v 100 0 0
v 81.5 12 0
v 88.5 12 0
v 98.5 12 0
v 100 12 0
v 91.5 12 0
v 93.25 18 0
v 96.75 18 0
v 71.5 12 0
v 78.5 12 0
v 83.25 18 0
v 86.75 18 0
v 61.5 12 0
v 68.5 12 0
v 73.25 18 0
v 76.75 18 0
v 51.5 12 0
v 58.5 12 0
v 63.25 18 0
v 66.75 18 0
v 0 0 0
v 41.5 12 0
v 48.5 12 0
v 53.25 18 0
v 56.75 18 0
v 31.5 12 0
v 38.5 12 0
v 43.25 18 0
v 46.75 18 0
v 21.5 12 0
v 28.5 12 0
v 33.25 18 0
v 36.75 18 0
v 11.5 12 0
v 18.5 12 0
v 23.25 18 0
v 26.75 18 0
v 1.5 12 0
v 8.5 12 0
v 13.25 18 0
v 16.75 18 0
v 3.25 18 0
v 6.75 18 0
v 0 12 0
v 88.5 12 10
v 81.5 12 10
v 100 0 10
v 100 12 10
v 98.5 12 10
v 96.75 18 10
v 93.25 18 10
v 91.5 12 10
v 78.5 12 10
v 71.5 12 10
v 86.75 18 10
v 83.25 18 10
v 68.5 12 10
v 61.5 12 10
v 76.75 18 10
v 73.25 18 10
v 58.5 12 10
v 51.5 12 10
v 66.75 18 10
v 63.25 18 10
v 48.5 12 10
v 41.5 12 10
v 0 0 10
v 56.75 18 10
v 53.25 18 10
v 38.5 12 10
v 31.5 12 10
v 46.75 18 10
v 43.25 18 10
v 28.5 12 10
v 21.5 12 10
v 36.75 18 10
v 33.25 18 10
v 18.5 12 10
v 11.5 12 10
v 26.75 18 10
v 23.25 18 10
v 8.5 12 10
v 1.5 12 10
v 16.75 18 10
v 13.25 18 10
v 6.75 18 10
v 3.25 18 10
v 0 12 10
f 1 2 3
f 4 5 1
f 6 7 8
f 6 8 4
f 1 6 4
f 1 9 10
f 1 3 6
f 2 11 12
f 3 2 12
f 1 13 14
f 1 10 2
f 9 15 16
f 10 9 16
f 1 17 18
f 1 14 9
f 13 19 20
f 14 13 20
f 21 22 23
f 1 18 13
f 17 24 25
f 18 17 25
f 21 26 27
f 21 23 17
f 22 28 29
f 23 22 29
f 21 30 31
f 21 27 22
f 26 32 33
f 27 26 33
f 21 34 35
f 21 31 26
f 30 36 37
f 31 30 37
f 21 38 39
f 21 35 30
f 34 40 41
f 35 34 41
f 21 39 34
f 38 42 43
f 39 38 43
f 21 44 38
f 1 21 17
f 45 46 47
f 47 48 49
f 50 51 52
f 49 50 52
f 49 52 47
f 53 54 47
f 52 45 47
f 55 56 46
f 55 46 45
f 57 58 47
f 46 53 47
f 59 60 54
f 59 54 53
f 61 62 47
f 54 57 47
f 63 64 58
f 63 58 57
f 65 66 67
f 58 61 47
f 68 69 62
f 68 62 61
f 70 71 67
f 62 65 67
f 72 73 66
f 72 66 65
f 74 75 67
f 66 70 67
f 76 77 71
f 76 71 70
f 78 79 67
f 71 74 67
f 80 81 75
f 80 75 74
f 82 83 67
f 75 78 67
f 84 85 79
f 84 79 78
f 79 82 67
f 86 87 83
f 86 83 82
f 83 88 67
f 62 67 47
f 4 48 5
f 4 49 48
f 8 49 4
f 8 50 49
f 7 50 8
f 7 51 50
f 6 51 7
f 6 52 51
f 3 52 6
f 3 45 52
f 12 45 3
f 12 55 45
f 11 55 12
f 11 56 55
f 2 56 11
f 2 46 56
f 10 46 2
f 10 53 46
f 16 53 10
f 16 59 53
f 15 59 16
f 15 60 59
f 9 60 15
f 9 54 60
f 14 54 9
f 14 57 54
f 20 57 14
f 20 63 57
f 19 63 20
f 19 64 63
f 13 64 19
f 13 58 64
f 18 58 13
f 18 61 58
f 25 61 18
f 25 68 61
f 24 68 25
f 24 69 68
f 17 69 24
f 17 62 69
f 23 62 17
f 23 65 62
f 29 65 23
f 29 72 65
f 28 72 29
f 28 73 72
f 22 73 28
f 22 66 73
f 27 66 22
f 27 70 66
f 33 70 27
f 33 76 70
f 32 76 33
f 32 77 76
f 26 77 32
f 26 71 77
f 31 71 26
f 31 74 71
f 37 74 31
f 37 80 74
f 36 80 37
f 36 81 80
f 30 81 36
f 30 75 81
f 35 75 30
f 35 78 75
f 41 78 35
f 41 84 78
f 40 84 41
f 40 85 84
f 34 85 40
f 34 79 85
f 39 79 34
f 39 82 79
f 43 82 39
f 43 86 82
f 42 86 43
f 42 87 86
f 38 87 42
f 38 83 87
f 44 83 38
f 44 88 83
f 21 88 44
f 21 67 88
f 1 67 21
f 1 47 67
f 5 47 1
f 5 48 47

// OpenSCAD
$fn = 32;

// ----------------------------------------------------------------------
// Gear rack: 10 teeth, pitch 10 mm
// ----------------------------------------------------------------------

// --- parameters (mm) ---
teeth = 10;               // number of teeth
pitch = 10;               // tooth pitch, X
root_w = 7;               // tooth width at the root
tip_w = 3.5;              // tooth width at the tip
base_h = 12;              // rack body height, Y
tooth_h = 6;              // tooth height above the body
plate_t = 10;             // rack width, Z (extrusion height)
fit_tol = 0.05;           // declared fit tolerance (prompt contract)
free_tol = 0.2;           // declared free tolerance (prompt contract)

rack_l = teeth * pitch;  // overall length
total_h = base_h + tooth_h;  // overall height

profile = [[0, 0], [100, 0], [100, 12], [98.5, 12], [96.75, 18], [93.25, 18], [91.5, 12], [88.5, 12], [86.75, 18], [83.25, 18], [81.5, 12], [78.5, 12], [76.75, 18], [73.25, 18], [71.5, 12], [68.5, 12], [66.75, 18], [63.25, 18], [61.5, 12], [58.5, 12], [56.75, 18], [53.25, 18], [51.5, 12], [48.5, 12], [46.75, 18], [43.25, 18], [41.5, 12], [38.5, 12], [36.75, 18], [33.25, 18], [31.5, 12], [28.5, 12], [26.75, 18], [23.25, 18], [21.5, 12], [18.5, 12], [16.75, 18], [13.25, 18], [11.5, 12], [8.5, 12], [6.75, 18], [3.25, 18], [1.5, 12], [0, 12]];  // primary outline, 44 points, counter clockwise

// --- the one profile operation ---
linear_extrude(height = plate_t) polygon(points = profile);
